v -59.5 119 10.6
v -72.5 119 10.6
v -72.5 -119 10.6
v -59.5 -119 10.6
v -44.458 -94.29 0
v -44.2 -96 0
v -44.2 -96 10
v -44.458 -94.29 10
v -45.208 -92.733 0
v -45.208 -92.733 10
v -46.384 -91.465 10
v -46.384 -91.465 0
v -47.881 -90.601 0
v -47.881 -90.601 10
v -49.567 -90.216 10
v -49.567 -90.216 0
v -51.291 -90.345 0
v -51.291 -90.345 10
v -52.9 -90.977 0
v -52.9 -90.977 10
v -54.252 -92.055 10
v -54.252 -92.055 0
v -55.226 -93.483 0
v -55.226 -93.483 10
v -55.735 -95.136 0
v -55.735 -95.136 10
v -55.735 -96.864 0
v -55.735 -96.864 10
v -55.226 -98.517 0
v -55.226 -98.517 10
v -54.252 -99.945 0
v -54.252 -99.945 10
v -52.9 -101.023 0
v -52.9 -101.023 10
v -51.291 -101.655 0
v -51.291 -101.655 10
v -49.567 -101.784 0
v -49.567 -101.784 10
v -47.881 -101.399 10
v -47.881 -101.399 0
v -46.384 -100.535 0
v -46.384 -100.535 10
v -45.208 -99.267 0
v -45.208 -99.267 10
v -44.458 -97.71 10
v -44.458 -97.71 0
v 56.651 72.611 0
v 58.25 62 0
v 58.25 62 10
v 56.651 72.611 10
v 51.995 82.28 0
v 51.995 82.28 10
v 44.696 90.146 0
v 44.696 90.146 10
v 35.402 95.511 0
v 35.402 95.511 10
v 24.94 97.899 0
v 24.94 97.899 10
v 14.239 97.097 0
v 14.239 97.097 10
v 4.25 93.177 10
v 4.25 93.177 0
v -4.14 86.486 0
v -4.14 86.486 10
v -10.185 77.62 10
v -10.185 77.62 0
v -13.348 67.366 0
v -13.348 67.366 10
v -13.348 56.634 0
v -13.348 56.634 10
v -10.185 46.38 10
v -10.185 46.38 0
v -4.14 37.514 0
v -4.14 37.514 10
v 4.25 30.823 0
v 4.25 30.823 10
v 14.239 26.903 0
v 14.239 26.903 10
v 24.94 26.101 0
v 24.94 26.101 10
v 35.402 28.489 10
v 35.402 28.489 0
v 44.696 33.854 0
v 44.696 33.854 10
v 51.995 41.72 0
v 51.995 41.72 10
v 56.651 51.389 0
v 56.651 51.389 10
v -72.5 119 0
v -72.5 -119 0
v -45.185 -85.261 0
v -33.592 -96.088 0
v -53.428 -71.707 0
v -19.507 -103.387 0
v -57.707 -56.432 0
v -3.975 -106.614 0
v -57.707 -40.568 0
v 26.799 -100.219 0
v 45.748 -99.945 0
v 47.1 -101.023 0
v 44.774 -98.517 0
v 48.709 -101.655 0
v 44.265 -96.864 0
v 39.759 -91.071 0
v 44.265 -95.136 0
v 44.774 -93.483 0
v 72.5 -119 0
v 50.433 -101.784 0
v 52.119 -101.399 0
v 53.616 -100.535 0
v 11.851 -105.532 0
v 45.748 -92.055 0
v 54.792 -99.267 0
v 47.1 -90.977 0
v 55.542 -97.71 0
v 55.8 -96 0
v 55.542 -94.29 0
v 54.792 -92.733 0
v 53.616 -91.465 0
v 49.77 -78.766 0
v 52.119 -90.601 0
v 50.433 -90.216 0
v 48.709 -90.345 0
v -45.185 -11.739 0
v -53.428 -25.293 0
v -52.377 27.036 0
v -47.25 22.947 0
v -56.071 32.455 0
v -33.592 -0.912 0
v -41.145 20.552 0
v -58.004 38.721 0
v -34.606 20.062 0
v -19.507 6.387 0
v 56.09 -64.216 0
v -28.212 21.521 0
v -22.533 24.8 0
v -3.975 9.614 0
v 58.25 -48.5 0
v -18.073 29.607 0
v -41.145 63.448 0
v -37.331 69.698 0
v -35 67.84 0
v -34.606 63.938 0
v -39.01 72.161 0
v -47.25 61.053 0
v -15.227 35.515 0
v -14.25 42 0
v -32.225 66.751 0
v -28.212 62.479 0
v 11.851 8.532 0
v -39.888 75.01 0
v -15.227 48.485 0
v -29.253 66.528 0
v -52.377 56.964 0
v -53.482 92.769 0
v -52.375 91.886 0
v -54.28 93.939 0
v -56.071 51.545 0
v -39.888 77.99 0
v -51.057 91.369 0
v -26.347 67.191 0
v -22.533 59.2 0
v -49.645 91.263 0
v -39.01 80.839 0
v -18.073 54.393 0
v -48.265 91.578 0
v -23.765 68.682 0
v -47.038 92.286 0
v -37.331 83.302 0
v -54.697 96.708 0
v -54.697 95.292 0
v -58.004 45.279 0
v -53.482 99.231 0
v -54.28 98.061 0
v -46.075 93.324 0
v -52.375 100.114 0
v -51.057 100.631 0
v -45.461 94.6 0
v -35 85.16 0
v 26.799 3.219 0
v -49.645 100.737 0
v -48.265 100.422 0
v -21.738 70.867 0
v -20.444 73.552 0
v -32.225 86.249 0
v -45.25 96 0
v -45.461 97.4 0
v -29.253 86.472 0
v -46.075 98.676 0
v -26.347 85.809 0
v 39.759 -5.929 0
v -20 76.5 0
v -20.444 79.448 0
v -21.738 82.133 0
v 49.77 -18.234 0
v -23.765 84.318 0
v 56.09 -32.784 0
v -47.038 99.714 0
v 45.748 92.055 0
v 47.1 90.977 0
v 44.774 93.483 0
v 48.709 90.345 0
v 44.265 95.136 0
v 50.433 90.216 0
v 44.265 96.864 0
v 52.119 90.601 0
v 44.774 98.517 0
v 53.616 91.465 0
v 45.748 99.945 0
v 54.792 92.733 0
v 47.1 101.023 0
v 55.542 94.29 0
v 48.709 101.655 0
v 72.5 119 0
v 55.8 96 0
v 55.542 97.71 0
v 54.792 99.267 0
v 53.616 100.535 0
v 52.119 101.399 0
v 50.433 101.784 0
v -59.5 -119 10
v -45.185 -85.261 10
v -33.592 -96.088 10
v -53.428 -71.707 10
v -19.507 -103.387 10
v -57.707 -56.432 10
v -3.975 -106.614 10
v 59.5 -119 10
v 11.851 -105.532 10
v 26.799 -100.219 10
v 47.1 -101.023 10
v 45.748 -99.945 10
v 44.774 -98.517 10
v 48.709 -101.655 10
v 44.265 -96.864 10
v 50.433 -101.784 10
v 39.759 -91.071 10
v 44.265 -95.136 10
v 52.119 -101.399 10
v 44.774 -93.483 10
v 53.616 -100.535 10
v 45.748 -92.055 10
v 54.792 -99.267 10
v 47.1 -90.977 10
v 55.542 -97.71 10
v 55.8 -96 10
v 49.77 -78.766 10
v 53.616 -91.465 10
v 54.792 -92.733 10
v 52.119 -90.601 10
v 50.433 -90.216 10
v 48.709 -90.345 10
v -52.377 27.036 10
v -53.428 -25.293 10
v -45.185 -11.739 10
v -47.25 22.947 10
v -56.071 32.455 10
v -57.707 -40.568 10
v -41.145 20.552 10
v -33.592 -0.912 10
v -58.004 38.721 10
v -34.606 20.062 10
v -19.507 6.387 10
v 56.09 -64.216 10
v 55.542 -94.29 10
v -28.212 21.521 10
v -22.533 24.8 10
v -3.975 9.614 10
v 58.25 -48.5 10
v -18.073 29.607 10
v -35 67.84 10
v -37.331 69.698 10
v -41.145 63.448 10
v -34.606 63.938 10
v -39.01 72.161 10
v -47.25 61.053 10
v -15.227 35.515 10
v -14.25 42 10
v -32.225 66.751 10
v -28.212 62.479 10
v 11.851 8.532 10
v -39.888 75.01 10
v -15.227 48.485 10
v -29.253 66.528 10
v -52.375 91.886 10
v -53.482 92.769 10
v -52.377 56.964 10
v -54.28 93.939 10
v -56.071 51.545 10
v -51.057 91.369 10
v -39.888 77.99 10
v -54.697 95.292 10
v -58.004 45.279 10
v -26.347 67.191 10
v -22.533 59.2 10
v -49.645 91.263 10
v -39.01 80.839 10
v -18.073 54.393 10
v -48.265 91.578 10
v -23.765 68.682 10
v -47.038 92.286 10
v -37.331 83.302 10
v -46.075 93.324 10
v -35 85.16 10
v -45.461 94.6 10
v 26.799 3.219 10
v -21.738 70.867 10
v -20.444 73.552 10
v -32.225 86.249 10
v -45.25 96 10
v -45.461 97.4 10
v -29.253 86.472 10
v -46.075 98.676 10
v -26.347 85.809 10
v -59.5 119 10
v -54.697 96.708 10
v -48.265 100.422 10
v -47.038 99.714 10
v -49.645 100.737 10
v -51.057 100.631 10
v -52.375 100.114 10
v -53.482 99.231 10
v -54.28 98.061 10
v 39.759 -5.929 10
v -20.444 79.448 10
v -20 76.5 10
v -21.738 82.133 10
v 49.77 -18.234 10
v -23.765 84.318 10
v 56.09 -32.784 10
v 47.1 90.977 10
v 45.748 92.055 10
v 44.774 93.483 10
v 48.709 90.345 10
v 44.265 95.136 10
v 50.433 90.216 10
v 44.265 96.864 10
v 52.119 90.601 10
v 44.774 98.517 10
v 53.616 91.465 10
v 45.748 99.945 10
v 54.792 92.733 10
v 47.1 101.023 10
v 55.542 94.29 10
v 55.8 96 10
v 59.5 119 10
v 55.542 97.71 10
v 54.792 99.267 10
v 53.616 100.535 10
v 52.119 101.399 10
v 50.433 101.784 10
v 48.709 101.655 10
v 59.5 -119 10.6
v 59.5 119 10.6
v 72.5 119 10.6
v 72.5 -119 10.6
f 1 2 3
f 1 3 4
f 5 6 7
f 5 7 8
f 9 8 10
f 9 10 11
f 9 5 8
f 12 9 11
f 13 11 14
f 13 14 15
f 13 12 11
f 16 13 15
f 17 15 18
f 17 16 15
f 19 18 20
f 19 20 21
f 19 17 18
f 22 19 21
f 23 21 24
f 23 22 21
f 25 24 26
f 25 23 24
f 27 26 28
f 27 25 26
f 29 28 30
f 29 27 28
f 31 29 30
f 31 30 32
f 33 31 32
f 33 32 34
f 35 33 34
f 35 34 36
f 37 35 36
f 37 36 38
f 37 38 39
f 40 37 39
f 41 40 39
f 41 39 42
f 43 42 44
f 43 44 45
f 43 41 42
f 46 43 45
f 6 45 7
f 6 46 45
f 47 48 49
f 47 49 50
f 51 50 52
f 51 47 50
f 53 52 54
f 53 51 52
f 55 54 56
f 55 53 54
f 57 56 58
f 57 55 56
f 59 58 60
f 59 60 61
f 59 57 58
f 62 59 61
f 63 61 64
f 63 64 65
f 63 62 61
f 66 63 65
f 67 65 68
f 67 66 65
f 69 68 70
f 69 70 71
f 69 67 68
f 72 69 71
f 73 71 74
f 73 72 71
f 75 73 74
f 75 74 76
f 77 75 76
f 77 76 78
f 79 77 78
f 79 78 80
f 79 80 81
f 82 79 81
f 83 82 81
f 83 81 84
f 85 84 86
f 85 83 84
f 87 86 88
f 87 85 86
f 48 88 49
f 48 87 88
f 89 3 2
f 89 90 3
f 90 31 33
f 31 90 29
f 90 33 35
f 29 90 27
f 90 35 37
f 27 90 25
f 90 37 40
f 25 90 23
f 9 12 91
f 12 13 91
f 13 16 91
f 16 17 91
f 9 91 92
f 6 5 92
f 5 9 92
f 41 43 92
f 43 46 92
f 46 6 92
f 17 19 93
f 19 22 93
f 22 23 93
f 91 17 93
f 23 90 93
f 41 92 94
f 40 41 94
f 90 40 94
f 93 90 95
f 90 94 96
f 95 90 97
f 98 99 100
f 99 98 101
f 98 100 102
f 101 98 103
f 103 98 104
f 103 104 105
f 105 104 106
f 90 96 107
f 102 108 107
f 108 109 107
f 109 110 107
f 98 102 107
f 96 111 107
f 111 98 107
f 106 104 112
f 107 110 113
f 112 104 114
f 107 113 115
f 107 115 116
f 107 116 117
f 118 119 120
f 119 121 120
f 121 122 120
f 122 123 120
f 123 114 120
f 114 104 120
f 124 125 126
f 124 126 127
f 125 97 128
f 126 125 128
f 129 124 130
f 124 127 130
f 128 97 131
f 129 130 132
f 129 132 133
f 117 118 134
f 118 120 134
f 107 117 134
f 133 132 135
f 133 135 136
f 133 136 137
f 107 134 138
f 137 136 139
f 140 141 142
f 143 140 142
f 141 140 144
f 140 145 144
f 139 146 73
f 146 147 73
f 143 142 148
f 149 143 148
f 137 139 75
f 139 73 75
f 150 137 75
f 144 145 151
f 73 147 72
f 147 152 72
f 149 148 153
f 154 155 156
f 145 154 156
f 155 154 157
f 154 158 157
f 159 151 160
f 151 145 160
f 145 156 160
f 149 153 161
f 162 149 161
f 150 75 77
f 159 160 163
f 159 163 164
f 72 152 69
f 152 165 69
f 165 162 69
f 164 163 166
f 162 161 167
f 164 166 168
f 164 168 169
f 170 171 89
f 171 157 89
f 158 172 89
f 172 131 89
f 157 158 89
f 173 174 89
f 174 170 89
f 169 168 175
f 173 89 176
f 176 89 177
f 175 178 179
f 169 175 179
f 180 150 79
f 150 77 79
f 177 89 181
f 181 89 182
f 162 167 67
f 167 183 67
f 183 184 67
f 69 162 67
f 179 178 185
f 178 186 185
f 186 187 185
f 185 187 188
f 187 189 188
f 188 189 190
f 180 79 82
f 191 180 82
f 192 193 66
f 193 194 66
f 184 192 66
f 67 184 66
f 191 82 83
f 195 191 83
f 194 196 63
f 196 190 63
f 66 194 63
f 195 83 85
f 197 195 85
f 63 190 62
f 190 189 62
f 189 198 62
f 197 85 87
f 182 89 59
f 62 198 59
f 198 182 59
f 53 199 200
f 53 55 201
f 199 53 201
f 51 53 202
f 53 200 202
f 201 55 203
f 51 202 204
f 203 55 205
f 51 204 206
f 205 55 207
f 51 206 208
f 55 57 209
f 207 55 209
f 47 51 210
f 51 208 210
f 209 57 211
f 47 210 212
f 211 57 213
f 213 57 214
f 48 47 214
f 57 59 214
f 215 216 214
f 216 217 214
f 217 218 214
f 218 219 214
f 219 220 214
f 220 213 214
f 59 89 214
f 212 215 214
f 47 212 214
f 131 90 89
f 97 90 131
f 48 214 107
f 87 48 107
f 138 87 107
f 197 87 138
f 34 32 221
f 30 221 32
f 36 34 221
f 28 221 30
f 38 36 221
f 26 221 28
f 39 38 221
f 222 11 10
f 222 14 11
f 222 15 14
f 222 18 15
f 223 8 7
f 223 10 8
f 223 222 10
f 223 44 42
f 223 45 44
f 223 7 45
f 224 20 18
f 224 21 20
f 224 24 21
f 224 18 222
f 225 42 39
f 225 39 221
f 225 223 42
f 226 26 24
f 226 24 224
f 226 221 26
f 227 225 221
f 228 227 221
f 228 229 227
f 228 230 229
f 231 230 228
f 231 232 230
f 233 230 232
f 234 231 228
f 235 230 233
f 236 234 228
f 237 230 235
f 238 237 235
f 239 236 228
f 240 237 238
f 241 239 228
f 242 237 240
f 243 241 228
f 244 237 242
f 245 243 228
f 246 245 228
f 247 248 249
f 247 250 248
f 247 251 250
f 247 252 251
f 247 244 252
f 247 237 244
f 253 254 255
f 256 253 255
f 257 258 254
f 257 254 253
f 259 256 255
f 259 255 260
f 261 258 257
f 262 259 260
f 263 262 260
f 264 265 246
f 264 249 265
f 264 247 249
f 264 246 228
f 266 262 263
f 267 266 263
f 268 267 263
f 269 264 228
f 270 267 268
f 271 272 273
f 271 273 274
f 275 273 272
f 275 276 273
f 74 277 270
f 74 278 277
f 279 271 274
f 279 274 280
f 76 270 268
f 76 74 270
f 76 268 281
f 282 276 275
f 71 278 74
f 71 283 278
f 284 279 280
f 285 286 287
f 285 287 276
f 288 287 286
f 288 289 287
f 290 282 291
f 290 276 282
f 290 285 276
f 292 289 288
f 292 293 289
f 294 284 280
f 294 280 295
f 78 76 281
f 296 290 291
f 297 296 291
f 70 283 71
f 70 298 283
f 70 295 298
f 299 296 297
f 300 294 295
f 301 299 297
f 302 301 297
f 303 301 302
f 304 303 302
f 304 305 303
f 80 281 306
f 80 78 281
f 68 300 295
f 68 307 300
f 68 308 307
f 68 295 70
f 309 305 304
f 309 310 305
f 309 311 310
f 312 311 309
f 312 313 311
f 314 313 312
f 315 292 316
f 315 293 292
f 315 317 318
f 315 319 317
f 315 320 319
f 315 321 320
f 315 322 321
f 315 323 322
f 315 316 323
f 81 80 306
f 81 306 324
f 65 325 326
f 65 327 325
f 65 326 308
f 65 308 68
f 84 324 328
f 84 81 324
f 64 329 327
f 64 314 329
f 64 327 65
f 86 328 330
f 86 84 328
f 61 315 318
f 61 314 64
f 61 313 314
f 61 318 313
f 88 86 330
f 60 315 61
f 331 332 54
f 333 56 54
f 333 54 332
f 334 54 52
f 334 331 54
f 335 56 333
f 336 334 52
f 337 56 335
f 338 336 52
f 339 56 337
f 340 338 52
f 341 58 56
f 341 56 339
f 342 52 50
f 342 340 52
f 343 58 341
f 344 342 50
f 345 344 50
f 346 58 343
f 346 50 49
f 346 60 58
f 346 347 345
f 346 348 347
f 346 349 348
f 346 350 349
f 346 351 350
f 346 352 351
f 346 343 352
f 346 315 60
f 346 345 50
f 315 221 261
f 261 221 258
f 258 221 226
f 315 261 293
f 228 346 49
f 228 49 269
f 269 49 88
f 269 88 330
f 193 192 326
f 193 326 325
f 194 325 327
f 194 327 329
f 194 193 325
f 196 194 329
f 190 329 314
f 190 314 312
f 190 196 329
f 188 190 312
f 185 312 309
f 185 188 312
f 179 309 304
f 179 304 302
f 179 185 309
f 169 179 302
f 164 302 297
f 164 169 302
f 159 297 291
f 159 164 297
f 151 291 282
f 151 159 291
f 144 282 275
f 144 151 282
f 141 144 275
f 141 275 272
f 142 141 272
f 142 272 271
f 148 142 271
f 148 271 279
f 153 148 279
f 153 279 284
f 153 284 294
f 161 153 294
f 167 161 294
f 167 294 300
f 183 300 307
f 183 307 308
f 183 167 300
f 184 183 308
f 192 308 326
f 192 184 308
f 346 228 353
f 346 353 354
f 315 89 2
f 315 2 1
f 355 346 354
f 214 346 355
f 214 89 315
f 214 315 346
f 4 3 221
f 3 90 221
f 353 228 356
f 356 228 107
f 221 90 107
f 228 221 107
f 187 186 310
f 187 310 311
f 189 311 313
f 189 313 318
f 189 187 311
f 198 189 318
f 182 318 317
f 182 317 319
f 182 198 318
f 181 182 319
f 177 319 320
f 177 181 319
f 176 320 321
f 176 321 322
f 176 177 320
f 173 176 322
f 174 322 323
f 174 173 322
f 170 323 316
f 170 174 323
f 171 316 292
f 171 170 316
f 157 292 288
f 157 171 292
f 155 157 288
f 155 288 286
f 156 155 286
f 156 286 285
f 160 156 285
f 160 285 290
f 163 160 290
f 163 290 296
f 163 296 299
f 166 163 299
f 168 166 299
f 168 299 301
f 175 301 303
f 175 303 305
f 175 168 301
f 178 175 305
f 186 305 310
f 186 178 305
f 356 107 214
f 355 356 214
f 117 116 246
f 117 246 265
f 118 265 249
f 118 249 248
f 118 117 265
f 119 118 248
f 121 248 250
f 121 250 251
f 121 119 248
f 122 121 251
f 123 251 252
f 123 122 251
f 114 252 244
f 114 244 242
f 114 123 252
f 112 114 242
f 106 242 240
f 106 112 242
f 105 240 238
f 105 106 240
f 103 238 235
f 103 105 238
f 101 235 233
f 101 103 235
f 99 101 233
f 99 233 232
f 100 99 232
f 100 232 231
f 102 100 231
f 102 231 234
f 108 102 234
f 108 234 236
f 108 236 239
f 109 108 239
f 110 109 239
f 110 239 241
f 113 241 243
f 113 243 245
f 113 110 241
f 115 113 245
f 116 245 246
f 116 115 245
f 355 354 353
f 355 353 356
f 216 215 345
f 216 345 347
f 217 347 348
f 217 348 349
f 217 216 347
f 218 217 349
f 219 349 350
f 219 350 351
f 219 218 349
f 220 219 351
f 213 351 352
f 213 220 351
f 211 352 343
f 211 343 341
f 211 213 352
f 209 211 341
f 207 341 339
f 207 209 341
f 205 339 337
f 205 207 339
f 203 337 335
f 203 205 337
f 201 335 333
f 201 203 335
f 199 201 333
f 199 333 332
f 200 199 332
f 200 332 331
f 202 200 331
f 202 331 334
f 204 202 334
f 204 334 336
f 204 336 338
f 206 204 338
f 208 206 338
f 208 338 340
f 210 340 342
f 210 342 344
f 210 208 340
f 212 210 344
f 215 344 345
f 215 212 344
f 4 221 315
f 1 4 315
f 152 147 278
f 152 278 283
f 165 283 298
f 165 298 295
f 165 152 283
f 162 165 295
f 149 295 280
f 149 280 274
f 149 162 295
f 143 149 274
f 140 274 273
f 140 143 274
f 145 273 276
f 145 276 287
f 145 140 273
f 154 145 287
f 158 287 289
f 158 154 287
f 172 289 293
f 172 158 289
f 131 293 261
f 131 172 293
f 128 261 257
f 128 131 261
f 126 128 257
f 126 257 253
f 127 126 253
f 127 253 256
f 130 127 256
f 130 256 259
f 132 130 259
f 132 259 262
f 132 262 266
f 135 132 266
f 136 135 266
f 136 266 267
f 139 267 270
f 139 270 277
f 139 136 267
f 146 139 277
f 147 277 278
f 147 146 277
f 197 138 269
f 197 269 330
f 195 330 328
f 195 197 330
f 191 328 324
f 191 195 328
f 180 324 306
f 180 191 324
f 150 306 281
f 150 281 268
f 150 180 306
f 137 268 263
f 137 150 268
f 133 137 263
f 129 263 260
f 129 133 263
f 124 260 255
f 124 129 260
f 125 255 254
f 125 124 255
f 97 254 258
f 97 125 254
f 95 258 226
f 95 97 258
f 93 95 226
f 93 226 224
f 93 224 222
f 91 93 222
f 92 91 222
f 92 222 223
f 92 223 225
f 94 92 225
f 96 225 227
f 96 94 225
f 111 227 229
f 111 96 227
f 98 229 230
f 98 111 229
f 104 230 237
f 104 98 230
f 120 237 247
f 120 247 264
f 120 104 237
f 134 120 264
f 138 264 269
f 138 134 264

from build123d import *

# Parameters (mm, degrees)
SKETCH1_W           = 145
SKETCH1_H           = 238
SKETCH1_R           = 5.8
SKETCH1_R_2         = 22
SKETCH1_R_3         = 36
SKETCH1_R_4         = 58.25
SKETCH1_R_5         = 10
SKETCH1_R_6         = 4.75
BOSS_EXTRUDE1_DEPTH = 10
SKETCH2_W           = 13
SKETCH2_H           = 238
BOSS_EXTRUDE2_DEPTH = 0.6


with BuildPart() as part:
    # Sketch1 → Boss-Extrude1 (new body)
    with BuildSketch(Plane.XY):
        Rectangle(SKETCH1_W, SKETCH1_H)
        with Locations((50, 96)):
            Circle(SKETCH1_R, mode=Mode.SUBTRACT)
        with Locations((50, -96)):
            Circle(SKETCH1_R, mode=Mode.SUBTRACT)
        with Locations((-50, -96)):
            Circle(SKETCH1_R, mode=Mode.SUBTRACT)
        with Locations((-36.25, 42)):
            Circle(SKETCH1_R_2, mode=Mode.SUBTRACT)
        with Locations((22.25, 62)):
            Circle(SKETCH1_R_3, mode=Mode.SUBTRACT)
        with Locations((0, -48.5)):
            Circle(SKETCH1_R_4, mode=Mode.SUBTRACT)
        with Locations((-30, 76.5)):
            Circle(SKETCH1_R_5, mode=Mode.SUBTRACT)
        with Locations((-50, 96)):
            Circle(SKETCH1_R_6, mode=Mode.SUBTRACT)
    extrude(amount=BOSS_EXTRUDE1_DEPTH)

    # Sketch2 → Boss-Extrude2 (add)
    with BuildSketch(Plane.XY.offset(10)):
        with Locations((-66, 0)):
            Rectangle(SKETCH2_W, SKETCH2_H)
        with Locations((66, 0)):
            Rectangle(SKETCH2_W, SKETCH2_H)
    extrude(amount=BOSS_EXTRUDE2_DEPTH)


solid = part.part
